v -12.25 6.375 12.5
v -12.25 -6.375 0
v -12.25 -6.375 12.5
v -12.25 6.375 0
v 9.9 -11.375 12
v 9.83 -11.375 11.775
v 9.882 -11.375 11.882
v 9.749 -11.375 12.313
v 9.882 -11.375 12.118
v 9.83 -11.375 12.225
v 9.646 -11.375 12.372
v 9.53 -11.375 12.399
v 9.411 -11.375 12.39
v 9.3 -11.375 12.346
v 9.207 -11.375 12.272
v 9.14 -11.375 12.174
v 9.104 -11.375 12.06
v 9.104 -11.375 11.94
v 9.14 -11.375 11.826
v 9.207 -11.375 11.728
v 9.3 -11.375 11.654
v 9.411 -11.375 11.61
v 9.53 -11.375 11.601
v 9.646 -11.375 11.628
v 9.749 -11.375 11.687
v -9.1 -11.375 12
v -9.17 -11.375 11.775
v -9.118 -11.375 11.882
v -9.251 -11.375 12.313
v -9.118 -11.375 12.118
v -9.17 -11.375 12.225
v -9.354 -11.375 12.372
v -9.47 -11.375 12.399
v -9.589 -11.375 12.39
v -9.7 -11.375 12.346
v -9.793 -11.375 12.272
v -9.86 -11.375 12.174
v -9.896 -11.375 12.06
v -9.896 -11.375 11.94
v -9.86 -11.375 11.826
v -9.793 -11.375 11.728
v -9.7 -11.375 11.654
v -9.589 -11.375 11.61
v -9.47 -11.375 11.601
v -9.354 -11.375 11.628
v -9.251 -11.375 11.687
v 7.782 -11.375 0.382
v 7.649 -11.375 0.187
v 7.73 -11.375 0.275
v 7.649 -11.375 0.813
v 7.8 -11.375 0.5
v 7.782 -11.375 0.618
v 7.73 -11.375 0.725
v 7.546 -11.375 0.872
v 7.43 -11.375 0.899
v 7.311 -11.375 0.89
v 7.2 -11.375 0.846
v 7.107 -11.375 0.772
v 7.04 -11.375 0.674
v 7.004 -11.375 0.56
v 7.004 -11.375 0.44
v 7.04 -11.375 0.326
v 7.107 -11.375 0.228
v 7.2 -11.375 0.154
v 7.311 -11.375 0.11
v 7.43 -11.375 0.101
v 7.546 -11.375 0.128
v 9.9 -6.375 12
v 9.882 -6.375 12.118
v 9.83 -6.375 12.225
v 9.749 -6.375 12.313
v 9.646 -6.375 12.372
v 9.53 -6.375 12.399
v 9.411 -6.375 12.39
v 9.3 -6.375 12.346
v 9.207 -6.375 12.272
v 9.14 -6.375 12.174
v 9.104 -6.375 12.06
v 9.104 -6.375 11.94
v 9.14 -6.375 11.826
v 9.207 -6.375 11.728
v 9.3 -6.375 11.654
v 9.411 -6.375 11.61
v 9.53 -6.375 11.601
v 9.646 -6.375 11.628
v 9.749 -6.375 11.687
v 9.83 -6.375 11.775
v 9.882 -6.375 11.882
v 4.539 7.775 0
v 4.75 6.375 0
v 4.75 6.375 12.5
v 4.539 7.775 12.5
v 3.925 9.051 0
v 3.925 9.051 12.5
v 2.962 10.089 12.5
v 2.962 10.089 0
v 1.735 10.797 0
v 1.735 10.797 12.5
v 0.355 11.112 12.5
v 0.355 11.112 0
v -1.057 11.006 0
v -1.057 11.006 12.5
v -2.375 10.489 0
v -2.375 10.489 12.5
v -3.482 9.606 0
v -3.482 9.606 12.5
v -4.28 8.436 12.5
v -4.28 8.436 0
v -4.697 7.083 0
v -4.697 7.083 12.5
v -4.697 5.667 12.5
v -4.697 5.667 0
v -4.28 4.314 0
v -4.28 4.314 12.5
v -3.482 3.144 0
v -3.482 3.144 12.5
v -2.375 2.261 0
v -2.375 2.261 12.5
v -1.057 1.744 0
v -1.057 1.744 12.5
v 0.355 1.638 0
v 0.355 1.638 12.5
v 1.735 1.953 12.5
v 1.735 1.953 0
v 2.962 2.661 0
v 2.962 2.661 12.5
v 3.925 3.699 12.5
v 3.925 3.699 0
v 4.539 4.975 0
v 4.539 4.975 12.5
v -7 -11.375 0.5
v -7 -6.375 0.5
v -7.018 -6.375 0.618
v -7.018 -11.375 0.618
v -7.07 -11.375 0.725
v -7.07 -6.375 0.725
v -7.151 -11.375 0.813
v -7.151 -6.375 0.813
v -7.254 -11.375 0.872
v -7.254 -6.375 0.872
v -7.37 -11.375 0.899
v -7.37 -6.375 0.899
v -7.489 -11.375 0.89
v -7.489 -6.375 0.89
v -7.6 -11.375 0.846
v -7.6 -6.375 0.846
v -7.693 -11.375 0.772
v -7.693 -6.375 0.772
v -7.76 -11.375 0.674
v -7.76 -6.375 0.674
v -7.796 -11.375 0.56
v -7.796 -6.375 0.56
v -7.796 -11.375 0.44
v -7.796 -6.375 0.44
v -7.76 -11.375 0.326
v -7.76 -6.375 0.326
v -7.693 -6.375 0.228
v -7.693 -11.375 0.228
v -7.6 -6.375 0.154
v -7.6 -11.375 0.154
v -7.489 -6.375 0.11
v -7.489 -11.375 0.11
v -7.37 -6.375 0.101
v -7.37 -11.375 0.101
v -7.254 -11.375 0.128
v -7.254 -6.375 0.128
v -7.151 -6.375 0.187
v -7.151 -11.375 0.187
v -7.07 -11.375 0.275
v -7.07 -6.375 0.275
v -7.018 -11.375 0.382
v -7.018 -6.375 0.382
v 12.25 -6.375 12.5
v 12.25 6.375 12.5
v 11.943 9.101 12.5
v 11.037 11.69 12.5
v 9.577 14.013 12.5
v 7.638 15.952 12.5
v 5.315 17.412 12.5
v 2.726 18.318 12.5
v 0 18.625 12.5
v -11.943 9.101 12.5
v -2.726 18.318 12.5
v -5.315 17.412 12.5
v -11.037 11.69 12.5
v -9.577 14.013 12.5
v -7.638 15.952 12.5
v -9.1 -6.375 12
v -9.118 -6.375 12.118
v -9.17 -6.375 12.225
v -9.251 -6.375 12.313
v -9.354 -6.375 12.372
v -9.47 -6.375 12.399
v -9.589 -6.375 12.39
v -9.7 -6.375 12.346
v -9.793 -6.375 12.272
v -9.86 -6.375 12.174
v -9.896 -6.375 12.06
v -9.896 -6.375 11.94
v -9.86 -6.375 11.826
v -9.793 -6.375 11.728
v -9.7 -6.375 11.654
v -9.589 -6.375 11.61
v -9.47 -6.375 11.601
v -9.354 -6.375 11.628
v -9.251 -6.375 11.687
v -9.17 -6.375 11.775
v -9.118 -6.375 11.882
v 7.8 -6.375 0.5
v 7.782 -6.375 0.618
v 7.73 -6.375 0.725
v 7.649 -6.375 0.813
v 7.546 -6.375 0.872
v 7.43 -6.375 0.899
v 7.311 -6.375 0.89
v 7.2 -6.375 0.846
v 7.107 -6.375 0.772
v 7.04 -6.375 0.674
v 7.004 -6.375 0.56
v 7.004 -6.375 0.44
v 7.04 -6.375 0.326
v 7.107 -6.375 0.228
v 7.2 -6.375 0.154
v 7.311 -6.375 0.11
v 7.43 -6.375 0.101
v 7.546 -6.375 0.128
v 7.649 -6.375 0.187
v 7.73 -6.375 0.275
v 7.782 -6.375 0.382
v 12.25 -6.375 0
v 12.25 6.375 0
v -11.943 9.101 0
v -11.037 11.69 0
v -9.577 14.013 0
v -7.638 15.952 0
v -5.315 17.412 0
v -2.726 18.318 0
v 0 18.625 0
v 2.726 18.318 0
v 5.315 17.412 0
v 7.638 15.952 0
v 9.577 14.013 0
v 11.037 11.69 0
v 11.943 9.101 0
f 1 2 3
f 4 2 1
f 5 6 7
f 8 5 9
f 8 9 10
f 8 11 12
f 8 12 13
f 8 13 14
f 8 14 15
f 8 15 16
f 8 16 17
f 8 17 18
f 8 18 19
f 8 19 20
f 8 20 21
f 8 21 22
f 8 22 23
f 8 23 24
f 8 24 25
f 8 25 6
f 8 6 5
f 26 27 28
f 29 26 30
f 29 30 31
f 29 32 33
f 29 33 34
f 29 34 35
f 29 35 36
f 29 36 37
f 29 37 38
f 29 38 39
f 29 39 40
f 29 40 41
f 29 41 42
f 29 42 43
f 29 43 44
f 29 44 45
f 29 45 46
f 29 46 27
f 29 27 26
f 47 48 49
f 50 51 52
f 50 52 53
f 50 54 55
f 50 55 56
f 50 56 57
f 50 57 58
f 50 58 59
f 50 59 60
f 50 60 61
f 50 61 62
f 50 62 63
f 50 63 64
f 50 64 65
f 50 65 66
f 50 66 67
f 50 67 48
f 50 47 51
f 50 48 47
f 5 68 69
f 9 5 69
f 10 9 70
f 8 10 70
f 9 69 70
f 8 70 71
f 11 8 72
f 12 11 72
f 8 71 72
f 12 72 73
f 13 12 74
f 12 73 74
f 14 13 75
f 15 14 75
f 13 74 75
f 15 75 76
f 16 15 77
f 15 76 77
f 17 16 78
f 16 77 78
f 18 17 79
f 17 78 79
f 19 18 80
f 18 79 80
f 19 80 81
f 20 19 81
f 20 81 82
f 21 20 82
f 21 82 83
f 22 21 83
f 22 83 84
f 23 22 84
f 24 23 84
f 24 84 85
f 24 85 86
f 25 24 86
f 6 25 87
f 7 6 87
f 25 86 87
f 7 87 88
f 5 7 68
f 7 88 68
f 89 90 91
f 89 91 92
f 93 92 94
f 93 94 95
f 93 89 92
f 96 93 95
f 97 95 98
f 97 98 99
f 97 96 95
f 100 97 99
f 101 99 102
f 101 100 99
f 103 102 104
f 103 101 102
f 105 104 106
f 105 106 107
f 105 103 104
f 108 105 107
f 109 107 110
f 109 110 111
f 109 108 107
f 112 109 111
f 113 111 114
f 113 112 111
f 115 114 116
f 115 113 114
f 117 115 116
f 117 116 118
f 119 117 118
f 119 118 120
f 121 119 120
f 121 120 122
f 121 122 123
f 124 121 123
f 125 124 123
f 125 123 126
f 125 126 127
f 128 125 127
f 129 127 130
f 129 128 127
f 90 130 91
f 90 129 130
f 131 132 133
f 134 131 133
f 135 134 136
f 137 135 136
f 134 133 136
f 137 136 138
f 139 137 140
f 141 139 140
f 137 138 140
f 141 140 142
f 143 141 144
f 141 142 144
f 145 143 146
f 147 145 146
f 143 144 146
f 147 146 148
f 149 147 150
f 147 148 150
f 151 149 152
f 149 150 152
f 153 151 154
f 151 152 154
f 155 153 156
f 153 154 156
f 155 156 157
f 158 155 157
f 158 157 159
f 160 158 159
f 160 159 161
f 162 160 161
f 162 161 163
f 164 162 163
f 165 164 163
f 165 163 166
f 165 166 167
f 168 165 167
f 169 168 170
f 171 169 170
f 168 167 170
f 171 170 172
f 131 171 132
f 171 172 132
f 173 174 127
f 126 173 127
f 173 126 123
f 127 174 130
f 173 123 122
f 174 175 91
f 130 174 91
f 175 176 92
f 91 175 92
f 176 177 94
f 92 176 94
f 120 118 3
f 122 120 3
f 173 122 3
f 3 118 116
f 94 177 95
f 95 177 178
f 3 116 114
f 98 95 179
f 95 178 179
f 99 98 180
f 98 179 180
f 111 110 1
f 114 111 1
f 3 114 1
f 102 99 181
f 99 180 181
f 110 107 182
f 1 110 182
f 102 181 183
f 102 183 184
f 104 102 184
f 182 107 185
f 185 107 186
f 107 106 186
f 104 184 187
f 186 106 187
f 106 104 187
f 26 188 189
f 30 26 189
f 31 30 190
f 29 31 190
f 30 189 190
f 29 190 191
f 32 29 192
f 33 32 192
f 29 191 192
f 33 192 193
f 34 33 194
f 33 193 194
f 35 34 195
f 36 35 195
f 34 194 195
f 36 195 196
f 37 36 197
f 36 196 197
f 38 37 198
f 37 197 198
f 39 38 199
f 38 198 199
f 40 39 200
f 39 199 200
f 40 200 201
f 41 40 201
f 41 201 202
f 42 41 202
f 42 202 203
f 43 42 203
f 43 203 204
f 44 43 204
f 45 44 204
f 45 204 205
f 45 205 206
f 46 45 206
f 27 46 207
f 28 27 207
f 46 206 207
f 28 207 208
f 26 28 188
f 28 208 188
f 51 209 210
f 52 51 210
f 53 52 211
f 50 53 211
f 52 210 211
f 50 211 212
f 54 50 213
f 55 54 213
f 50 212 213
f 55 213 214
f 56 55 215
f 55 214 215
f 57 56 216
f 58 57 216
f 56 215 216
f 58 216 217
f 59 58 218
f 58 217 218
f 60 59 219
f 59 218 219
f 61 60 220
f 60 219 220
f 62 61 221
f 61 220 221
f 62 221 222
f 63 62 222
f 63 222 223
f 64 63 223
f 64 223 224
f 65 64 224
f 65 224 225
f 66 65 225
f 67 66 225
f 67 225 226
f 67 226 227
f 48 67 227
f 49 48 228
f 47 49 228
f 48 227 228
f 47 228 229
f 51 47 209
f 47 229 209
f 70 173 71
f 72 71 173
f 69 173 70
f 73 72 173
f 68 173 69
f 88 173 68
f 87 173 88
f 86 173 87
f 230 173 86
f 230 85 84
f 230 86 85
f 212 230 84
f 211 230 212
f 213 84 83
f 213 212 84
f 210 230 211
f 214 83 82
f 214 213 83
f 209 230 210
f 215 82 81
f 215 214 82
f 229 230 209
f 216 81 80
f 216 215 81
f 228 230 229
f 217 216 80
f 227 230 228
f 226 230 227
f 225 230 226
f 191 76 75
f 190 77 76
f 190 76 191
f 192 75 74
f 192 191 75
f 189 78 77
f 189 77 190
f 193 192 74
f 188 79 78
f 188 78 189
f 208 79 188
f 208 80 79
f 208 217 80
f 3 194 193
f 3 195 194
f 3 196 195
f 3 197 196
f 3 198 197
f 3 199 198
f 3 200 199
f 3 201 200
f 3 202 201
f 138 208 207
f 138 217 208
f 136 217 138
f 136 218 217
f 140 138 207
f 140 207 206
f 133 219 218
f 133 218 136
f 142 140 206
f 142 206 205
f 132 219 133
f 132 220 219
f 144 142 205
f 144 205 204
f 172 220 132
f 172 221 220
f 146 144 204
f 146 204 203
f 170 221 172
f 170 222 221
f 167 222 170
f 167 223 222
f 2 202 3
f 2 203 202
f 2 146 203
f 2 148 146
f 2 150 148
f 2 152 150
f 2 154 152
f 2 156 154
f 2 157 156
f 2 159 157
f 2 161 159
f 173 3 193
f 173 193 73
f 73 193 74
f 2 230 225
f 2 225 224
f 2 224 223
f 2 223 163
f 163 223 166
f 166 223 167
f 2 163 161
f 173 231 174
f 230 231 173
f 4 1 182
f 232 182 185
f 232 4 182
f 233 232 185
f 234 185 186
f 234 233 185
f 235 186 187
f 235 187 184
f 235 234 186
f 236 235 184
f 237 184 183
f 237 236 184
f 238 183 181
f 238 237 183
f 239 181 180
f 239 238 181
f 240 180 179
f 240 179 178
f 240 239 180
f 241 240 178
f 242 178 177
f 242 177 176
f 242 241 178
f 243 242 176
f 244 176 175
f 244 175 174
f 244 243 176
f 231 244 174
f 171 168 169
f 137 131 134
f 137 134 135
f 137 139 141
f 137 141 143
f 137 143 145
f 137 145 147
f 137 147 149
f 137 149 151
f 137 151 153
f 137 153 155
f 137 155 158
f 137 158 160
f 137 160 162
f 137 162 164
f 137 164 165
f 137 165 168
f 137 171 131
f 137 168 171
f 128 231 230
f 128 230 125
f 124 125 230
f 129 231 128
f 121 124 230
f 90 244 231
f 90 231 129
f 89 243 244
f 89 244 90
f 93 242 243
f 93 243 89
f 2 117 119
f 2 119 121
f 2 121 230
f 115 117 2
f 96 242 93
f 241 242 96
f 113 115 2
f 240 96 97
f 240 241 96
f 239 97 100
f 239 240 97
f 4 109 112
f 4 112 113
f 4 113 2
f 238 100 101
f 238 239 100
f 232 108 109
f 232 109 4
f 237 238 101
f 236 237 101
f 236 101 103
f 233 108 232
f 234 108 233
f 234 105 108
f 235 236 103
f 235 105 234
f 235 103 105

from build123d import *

# Parameters (mm, degrees)
SKETCH_1_R      = 4.75
EXTRUDE_1_DEPTH = 12.5
SKETCH_2_R      = 0.4
EXTRUDE_2_DEPTH = 5


with BuildPart() as part:
    # Эскиз1 → Бобышка-Вытянуть1 (new body)
    with BuildSketch(Plane.XY):
        with BuildLine():
            Line((12.25, -6.375), (-12.25, -6.375))
            Line((-12.25, -6.375), (-12.25, 6.375))
            ThreePointArc((-12.25, 6.375), (0, 18.625), (12.25, 6.375))
            Line((12.25, 6.375), (12.25, -6.375))
        make_face()
        with Locations((0, 6.375)):
            Circle(SKETCH_1_R, mode=Mode.SUBTRACT)
    extrude(amount=EXTRUDE_1_DEPTH)

    # Эскиз2 → Бобышка-Вытянуть2 (add)
    with BuildSketch(Plane.XZ.offset(6.375)):
        with Locations((7.4, 0.5)):
            Circle(SKETCH_2_R)
        with Locations((-7.4, 0.5)):
            Circle(SKETCH_2_R)
        with Locations((9.5, 12)):
            Circle(SKETCH_2_R)
        with Locations((-9.5, 12)):
            Circle(SKETCH_2_R)
    extrude(amount=EXTRUDE_2_DEPTH)


solid = part.part
